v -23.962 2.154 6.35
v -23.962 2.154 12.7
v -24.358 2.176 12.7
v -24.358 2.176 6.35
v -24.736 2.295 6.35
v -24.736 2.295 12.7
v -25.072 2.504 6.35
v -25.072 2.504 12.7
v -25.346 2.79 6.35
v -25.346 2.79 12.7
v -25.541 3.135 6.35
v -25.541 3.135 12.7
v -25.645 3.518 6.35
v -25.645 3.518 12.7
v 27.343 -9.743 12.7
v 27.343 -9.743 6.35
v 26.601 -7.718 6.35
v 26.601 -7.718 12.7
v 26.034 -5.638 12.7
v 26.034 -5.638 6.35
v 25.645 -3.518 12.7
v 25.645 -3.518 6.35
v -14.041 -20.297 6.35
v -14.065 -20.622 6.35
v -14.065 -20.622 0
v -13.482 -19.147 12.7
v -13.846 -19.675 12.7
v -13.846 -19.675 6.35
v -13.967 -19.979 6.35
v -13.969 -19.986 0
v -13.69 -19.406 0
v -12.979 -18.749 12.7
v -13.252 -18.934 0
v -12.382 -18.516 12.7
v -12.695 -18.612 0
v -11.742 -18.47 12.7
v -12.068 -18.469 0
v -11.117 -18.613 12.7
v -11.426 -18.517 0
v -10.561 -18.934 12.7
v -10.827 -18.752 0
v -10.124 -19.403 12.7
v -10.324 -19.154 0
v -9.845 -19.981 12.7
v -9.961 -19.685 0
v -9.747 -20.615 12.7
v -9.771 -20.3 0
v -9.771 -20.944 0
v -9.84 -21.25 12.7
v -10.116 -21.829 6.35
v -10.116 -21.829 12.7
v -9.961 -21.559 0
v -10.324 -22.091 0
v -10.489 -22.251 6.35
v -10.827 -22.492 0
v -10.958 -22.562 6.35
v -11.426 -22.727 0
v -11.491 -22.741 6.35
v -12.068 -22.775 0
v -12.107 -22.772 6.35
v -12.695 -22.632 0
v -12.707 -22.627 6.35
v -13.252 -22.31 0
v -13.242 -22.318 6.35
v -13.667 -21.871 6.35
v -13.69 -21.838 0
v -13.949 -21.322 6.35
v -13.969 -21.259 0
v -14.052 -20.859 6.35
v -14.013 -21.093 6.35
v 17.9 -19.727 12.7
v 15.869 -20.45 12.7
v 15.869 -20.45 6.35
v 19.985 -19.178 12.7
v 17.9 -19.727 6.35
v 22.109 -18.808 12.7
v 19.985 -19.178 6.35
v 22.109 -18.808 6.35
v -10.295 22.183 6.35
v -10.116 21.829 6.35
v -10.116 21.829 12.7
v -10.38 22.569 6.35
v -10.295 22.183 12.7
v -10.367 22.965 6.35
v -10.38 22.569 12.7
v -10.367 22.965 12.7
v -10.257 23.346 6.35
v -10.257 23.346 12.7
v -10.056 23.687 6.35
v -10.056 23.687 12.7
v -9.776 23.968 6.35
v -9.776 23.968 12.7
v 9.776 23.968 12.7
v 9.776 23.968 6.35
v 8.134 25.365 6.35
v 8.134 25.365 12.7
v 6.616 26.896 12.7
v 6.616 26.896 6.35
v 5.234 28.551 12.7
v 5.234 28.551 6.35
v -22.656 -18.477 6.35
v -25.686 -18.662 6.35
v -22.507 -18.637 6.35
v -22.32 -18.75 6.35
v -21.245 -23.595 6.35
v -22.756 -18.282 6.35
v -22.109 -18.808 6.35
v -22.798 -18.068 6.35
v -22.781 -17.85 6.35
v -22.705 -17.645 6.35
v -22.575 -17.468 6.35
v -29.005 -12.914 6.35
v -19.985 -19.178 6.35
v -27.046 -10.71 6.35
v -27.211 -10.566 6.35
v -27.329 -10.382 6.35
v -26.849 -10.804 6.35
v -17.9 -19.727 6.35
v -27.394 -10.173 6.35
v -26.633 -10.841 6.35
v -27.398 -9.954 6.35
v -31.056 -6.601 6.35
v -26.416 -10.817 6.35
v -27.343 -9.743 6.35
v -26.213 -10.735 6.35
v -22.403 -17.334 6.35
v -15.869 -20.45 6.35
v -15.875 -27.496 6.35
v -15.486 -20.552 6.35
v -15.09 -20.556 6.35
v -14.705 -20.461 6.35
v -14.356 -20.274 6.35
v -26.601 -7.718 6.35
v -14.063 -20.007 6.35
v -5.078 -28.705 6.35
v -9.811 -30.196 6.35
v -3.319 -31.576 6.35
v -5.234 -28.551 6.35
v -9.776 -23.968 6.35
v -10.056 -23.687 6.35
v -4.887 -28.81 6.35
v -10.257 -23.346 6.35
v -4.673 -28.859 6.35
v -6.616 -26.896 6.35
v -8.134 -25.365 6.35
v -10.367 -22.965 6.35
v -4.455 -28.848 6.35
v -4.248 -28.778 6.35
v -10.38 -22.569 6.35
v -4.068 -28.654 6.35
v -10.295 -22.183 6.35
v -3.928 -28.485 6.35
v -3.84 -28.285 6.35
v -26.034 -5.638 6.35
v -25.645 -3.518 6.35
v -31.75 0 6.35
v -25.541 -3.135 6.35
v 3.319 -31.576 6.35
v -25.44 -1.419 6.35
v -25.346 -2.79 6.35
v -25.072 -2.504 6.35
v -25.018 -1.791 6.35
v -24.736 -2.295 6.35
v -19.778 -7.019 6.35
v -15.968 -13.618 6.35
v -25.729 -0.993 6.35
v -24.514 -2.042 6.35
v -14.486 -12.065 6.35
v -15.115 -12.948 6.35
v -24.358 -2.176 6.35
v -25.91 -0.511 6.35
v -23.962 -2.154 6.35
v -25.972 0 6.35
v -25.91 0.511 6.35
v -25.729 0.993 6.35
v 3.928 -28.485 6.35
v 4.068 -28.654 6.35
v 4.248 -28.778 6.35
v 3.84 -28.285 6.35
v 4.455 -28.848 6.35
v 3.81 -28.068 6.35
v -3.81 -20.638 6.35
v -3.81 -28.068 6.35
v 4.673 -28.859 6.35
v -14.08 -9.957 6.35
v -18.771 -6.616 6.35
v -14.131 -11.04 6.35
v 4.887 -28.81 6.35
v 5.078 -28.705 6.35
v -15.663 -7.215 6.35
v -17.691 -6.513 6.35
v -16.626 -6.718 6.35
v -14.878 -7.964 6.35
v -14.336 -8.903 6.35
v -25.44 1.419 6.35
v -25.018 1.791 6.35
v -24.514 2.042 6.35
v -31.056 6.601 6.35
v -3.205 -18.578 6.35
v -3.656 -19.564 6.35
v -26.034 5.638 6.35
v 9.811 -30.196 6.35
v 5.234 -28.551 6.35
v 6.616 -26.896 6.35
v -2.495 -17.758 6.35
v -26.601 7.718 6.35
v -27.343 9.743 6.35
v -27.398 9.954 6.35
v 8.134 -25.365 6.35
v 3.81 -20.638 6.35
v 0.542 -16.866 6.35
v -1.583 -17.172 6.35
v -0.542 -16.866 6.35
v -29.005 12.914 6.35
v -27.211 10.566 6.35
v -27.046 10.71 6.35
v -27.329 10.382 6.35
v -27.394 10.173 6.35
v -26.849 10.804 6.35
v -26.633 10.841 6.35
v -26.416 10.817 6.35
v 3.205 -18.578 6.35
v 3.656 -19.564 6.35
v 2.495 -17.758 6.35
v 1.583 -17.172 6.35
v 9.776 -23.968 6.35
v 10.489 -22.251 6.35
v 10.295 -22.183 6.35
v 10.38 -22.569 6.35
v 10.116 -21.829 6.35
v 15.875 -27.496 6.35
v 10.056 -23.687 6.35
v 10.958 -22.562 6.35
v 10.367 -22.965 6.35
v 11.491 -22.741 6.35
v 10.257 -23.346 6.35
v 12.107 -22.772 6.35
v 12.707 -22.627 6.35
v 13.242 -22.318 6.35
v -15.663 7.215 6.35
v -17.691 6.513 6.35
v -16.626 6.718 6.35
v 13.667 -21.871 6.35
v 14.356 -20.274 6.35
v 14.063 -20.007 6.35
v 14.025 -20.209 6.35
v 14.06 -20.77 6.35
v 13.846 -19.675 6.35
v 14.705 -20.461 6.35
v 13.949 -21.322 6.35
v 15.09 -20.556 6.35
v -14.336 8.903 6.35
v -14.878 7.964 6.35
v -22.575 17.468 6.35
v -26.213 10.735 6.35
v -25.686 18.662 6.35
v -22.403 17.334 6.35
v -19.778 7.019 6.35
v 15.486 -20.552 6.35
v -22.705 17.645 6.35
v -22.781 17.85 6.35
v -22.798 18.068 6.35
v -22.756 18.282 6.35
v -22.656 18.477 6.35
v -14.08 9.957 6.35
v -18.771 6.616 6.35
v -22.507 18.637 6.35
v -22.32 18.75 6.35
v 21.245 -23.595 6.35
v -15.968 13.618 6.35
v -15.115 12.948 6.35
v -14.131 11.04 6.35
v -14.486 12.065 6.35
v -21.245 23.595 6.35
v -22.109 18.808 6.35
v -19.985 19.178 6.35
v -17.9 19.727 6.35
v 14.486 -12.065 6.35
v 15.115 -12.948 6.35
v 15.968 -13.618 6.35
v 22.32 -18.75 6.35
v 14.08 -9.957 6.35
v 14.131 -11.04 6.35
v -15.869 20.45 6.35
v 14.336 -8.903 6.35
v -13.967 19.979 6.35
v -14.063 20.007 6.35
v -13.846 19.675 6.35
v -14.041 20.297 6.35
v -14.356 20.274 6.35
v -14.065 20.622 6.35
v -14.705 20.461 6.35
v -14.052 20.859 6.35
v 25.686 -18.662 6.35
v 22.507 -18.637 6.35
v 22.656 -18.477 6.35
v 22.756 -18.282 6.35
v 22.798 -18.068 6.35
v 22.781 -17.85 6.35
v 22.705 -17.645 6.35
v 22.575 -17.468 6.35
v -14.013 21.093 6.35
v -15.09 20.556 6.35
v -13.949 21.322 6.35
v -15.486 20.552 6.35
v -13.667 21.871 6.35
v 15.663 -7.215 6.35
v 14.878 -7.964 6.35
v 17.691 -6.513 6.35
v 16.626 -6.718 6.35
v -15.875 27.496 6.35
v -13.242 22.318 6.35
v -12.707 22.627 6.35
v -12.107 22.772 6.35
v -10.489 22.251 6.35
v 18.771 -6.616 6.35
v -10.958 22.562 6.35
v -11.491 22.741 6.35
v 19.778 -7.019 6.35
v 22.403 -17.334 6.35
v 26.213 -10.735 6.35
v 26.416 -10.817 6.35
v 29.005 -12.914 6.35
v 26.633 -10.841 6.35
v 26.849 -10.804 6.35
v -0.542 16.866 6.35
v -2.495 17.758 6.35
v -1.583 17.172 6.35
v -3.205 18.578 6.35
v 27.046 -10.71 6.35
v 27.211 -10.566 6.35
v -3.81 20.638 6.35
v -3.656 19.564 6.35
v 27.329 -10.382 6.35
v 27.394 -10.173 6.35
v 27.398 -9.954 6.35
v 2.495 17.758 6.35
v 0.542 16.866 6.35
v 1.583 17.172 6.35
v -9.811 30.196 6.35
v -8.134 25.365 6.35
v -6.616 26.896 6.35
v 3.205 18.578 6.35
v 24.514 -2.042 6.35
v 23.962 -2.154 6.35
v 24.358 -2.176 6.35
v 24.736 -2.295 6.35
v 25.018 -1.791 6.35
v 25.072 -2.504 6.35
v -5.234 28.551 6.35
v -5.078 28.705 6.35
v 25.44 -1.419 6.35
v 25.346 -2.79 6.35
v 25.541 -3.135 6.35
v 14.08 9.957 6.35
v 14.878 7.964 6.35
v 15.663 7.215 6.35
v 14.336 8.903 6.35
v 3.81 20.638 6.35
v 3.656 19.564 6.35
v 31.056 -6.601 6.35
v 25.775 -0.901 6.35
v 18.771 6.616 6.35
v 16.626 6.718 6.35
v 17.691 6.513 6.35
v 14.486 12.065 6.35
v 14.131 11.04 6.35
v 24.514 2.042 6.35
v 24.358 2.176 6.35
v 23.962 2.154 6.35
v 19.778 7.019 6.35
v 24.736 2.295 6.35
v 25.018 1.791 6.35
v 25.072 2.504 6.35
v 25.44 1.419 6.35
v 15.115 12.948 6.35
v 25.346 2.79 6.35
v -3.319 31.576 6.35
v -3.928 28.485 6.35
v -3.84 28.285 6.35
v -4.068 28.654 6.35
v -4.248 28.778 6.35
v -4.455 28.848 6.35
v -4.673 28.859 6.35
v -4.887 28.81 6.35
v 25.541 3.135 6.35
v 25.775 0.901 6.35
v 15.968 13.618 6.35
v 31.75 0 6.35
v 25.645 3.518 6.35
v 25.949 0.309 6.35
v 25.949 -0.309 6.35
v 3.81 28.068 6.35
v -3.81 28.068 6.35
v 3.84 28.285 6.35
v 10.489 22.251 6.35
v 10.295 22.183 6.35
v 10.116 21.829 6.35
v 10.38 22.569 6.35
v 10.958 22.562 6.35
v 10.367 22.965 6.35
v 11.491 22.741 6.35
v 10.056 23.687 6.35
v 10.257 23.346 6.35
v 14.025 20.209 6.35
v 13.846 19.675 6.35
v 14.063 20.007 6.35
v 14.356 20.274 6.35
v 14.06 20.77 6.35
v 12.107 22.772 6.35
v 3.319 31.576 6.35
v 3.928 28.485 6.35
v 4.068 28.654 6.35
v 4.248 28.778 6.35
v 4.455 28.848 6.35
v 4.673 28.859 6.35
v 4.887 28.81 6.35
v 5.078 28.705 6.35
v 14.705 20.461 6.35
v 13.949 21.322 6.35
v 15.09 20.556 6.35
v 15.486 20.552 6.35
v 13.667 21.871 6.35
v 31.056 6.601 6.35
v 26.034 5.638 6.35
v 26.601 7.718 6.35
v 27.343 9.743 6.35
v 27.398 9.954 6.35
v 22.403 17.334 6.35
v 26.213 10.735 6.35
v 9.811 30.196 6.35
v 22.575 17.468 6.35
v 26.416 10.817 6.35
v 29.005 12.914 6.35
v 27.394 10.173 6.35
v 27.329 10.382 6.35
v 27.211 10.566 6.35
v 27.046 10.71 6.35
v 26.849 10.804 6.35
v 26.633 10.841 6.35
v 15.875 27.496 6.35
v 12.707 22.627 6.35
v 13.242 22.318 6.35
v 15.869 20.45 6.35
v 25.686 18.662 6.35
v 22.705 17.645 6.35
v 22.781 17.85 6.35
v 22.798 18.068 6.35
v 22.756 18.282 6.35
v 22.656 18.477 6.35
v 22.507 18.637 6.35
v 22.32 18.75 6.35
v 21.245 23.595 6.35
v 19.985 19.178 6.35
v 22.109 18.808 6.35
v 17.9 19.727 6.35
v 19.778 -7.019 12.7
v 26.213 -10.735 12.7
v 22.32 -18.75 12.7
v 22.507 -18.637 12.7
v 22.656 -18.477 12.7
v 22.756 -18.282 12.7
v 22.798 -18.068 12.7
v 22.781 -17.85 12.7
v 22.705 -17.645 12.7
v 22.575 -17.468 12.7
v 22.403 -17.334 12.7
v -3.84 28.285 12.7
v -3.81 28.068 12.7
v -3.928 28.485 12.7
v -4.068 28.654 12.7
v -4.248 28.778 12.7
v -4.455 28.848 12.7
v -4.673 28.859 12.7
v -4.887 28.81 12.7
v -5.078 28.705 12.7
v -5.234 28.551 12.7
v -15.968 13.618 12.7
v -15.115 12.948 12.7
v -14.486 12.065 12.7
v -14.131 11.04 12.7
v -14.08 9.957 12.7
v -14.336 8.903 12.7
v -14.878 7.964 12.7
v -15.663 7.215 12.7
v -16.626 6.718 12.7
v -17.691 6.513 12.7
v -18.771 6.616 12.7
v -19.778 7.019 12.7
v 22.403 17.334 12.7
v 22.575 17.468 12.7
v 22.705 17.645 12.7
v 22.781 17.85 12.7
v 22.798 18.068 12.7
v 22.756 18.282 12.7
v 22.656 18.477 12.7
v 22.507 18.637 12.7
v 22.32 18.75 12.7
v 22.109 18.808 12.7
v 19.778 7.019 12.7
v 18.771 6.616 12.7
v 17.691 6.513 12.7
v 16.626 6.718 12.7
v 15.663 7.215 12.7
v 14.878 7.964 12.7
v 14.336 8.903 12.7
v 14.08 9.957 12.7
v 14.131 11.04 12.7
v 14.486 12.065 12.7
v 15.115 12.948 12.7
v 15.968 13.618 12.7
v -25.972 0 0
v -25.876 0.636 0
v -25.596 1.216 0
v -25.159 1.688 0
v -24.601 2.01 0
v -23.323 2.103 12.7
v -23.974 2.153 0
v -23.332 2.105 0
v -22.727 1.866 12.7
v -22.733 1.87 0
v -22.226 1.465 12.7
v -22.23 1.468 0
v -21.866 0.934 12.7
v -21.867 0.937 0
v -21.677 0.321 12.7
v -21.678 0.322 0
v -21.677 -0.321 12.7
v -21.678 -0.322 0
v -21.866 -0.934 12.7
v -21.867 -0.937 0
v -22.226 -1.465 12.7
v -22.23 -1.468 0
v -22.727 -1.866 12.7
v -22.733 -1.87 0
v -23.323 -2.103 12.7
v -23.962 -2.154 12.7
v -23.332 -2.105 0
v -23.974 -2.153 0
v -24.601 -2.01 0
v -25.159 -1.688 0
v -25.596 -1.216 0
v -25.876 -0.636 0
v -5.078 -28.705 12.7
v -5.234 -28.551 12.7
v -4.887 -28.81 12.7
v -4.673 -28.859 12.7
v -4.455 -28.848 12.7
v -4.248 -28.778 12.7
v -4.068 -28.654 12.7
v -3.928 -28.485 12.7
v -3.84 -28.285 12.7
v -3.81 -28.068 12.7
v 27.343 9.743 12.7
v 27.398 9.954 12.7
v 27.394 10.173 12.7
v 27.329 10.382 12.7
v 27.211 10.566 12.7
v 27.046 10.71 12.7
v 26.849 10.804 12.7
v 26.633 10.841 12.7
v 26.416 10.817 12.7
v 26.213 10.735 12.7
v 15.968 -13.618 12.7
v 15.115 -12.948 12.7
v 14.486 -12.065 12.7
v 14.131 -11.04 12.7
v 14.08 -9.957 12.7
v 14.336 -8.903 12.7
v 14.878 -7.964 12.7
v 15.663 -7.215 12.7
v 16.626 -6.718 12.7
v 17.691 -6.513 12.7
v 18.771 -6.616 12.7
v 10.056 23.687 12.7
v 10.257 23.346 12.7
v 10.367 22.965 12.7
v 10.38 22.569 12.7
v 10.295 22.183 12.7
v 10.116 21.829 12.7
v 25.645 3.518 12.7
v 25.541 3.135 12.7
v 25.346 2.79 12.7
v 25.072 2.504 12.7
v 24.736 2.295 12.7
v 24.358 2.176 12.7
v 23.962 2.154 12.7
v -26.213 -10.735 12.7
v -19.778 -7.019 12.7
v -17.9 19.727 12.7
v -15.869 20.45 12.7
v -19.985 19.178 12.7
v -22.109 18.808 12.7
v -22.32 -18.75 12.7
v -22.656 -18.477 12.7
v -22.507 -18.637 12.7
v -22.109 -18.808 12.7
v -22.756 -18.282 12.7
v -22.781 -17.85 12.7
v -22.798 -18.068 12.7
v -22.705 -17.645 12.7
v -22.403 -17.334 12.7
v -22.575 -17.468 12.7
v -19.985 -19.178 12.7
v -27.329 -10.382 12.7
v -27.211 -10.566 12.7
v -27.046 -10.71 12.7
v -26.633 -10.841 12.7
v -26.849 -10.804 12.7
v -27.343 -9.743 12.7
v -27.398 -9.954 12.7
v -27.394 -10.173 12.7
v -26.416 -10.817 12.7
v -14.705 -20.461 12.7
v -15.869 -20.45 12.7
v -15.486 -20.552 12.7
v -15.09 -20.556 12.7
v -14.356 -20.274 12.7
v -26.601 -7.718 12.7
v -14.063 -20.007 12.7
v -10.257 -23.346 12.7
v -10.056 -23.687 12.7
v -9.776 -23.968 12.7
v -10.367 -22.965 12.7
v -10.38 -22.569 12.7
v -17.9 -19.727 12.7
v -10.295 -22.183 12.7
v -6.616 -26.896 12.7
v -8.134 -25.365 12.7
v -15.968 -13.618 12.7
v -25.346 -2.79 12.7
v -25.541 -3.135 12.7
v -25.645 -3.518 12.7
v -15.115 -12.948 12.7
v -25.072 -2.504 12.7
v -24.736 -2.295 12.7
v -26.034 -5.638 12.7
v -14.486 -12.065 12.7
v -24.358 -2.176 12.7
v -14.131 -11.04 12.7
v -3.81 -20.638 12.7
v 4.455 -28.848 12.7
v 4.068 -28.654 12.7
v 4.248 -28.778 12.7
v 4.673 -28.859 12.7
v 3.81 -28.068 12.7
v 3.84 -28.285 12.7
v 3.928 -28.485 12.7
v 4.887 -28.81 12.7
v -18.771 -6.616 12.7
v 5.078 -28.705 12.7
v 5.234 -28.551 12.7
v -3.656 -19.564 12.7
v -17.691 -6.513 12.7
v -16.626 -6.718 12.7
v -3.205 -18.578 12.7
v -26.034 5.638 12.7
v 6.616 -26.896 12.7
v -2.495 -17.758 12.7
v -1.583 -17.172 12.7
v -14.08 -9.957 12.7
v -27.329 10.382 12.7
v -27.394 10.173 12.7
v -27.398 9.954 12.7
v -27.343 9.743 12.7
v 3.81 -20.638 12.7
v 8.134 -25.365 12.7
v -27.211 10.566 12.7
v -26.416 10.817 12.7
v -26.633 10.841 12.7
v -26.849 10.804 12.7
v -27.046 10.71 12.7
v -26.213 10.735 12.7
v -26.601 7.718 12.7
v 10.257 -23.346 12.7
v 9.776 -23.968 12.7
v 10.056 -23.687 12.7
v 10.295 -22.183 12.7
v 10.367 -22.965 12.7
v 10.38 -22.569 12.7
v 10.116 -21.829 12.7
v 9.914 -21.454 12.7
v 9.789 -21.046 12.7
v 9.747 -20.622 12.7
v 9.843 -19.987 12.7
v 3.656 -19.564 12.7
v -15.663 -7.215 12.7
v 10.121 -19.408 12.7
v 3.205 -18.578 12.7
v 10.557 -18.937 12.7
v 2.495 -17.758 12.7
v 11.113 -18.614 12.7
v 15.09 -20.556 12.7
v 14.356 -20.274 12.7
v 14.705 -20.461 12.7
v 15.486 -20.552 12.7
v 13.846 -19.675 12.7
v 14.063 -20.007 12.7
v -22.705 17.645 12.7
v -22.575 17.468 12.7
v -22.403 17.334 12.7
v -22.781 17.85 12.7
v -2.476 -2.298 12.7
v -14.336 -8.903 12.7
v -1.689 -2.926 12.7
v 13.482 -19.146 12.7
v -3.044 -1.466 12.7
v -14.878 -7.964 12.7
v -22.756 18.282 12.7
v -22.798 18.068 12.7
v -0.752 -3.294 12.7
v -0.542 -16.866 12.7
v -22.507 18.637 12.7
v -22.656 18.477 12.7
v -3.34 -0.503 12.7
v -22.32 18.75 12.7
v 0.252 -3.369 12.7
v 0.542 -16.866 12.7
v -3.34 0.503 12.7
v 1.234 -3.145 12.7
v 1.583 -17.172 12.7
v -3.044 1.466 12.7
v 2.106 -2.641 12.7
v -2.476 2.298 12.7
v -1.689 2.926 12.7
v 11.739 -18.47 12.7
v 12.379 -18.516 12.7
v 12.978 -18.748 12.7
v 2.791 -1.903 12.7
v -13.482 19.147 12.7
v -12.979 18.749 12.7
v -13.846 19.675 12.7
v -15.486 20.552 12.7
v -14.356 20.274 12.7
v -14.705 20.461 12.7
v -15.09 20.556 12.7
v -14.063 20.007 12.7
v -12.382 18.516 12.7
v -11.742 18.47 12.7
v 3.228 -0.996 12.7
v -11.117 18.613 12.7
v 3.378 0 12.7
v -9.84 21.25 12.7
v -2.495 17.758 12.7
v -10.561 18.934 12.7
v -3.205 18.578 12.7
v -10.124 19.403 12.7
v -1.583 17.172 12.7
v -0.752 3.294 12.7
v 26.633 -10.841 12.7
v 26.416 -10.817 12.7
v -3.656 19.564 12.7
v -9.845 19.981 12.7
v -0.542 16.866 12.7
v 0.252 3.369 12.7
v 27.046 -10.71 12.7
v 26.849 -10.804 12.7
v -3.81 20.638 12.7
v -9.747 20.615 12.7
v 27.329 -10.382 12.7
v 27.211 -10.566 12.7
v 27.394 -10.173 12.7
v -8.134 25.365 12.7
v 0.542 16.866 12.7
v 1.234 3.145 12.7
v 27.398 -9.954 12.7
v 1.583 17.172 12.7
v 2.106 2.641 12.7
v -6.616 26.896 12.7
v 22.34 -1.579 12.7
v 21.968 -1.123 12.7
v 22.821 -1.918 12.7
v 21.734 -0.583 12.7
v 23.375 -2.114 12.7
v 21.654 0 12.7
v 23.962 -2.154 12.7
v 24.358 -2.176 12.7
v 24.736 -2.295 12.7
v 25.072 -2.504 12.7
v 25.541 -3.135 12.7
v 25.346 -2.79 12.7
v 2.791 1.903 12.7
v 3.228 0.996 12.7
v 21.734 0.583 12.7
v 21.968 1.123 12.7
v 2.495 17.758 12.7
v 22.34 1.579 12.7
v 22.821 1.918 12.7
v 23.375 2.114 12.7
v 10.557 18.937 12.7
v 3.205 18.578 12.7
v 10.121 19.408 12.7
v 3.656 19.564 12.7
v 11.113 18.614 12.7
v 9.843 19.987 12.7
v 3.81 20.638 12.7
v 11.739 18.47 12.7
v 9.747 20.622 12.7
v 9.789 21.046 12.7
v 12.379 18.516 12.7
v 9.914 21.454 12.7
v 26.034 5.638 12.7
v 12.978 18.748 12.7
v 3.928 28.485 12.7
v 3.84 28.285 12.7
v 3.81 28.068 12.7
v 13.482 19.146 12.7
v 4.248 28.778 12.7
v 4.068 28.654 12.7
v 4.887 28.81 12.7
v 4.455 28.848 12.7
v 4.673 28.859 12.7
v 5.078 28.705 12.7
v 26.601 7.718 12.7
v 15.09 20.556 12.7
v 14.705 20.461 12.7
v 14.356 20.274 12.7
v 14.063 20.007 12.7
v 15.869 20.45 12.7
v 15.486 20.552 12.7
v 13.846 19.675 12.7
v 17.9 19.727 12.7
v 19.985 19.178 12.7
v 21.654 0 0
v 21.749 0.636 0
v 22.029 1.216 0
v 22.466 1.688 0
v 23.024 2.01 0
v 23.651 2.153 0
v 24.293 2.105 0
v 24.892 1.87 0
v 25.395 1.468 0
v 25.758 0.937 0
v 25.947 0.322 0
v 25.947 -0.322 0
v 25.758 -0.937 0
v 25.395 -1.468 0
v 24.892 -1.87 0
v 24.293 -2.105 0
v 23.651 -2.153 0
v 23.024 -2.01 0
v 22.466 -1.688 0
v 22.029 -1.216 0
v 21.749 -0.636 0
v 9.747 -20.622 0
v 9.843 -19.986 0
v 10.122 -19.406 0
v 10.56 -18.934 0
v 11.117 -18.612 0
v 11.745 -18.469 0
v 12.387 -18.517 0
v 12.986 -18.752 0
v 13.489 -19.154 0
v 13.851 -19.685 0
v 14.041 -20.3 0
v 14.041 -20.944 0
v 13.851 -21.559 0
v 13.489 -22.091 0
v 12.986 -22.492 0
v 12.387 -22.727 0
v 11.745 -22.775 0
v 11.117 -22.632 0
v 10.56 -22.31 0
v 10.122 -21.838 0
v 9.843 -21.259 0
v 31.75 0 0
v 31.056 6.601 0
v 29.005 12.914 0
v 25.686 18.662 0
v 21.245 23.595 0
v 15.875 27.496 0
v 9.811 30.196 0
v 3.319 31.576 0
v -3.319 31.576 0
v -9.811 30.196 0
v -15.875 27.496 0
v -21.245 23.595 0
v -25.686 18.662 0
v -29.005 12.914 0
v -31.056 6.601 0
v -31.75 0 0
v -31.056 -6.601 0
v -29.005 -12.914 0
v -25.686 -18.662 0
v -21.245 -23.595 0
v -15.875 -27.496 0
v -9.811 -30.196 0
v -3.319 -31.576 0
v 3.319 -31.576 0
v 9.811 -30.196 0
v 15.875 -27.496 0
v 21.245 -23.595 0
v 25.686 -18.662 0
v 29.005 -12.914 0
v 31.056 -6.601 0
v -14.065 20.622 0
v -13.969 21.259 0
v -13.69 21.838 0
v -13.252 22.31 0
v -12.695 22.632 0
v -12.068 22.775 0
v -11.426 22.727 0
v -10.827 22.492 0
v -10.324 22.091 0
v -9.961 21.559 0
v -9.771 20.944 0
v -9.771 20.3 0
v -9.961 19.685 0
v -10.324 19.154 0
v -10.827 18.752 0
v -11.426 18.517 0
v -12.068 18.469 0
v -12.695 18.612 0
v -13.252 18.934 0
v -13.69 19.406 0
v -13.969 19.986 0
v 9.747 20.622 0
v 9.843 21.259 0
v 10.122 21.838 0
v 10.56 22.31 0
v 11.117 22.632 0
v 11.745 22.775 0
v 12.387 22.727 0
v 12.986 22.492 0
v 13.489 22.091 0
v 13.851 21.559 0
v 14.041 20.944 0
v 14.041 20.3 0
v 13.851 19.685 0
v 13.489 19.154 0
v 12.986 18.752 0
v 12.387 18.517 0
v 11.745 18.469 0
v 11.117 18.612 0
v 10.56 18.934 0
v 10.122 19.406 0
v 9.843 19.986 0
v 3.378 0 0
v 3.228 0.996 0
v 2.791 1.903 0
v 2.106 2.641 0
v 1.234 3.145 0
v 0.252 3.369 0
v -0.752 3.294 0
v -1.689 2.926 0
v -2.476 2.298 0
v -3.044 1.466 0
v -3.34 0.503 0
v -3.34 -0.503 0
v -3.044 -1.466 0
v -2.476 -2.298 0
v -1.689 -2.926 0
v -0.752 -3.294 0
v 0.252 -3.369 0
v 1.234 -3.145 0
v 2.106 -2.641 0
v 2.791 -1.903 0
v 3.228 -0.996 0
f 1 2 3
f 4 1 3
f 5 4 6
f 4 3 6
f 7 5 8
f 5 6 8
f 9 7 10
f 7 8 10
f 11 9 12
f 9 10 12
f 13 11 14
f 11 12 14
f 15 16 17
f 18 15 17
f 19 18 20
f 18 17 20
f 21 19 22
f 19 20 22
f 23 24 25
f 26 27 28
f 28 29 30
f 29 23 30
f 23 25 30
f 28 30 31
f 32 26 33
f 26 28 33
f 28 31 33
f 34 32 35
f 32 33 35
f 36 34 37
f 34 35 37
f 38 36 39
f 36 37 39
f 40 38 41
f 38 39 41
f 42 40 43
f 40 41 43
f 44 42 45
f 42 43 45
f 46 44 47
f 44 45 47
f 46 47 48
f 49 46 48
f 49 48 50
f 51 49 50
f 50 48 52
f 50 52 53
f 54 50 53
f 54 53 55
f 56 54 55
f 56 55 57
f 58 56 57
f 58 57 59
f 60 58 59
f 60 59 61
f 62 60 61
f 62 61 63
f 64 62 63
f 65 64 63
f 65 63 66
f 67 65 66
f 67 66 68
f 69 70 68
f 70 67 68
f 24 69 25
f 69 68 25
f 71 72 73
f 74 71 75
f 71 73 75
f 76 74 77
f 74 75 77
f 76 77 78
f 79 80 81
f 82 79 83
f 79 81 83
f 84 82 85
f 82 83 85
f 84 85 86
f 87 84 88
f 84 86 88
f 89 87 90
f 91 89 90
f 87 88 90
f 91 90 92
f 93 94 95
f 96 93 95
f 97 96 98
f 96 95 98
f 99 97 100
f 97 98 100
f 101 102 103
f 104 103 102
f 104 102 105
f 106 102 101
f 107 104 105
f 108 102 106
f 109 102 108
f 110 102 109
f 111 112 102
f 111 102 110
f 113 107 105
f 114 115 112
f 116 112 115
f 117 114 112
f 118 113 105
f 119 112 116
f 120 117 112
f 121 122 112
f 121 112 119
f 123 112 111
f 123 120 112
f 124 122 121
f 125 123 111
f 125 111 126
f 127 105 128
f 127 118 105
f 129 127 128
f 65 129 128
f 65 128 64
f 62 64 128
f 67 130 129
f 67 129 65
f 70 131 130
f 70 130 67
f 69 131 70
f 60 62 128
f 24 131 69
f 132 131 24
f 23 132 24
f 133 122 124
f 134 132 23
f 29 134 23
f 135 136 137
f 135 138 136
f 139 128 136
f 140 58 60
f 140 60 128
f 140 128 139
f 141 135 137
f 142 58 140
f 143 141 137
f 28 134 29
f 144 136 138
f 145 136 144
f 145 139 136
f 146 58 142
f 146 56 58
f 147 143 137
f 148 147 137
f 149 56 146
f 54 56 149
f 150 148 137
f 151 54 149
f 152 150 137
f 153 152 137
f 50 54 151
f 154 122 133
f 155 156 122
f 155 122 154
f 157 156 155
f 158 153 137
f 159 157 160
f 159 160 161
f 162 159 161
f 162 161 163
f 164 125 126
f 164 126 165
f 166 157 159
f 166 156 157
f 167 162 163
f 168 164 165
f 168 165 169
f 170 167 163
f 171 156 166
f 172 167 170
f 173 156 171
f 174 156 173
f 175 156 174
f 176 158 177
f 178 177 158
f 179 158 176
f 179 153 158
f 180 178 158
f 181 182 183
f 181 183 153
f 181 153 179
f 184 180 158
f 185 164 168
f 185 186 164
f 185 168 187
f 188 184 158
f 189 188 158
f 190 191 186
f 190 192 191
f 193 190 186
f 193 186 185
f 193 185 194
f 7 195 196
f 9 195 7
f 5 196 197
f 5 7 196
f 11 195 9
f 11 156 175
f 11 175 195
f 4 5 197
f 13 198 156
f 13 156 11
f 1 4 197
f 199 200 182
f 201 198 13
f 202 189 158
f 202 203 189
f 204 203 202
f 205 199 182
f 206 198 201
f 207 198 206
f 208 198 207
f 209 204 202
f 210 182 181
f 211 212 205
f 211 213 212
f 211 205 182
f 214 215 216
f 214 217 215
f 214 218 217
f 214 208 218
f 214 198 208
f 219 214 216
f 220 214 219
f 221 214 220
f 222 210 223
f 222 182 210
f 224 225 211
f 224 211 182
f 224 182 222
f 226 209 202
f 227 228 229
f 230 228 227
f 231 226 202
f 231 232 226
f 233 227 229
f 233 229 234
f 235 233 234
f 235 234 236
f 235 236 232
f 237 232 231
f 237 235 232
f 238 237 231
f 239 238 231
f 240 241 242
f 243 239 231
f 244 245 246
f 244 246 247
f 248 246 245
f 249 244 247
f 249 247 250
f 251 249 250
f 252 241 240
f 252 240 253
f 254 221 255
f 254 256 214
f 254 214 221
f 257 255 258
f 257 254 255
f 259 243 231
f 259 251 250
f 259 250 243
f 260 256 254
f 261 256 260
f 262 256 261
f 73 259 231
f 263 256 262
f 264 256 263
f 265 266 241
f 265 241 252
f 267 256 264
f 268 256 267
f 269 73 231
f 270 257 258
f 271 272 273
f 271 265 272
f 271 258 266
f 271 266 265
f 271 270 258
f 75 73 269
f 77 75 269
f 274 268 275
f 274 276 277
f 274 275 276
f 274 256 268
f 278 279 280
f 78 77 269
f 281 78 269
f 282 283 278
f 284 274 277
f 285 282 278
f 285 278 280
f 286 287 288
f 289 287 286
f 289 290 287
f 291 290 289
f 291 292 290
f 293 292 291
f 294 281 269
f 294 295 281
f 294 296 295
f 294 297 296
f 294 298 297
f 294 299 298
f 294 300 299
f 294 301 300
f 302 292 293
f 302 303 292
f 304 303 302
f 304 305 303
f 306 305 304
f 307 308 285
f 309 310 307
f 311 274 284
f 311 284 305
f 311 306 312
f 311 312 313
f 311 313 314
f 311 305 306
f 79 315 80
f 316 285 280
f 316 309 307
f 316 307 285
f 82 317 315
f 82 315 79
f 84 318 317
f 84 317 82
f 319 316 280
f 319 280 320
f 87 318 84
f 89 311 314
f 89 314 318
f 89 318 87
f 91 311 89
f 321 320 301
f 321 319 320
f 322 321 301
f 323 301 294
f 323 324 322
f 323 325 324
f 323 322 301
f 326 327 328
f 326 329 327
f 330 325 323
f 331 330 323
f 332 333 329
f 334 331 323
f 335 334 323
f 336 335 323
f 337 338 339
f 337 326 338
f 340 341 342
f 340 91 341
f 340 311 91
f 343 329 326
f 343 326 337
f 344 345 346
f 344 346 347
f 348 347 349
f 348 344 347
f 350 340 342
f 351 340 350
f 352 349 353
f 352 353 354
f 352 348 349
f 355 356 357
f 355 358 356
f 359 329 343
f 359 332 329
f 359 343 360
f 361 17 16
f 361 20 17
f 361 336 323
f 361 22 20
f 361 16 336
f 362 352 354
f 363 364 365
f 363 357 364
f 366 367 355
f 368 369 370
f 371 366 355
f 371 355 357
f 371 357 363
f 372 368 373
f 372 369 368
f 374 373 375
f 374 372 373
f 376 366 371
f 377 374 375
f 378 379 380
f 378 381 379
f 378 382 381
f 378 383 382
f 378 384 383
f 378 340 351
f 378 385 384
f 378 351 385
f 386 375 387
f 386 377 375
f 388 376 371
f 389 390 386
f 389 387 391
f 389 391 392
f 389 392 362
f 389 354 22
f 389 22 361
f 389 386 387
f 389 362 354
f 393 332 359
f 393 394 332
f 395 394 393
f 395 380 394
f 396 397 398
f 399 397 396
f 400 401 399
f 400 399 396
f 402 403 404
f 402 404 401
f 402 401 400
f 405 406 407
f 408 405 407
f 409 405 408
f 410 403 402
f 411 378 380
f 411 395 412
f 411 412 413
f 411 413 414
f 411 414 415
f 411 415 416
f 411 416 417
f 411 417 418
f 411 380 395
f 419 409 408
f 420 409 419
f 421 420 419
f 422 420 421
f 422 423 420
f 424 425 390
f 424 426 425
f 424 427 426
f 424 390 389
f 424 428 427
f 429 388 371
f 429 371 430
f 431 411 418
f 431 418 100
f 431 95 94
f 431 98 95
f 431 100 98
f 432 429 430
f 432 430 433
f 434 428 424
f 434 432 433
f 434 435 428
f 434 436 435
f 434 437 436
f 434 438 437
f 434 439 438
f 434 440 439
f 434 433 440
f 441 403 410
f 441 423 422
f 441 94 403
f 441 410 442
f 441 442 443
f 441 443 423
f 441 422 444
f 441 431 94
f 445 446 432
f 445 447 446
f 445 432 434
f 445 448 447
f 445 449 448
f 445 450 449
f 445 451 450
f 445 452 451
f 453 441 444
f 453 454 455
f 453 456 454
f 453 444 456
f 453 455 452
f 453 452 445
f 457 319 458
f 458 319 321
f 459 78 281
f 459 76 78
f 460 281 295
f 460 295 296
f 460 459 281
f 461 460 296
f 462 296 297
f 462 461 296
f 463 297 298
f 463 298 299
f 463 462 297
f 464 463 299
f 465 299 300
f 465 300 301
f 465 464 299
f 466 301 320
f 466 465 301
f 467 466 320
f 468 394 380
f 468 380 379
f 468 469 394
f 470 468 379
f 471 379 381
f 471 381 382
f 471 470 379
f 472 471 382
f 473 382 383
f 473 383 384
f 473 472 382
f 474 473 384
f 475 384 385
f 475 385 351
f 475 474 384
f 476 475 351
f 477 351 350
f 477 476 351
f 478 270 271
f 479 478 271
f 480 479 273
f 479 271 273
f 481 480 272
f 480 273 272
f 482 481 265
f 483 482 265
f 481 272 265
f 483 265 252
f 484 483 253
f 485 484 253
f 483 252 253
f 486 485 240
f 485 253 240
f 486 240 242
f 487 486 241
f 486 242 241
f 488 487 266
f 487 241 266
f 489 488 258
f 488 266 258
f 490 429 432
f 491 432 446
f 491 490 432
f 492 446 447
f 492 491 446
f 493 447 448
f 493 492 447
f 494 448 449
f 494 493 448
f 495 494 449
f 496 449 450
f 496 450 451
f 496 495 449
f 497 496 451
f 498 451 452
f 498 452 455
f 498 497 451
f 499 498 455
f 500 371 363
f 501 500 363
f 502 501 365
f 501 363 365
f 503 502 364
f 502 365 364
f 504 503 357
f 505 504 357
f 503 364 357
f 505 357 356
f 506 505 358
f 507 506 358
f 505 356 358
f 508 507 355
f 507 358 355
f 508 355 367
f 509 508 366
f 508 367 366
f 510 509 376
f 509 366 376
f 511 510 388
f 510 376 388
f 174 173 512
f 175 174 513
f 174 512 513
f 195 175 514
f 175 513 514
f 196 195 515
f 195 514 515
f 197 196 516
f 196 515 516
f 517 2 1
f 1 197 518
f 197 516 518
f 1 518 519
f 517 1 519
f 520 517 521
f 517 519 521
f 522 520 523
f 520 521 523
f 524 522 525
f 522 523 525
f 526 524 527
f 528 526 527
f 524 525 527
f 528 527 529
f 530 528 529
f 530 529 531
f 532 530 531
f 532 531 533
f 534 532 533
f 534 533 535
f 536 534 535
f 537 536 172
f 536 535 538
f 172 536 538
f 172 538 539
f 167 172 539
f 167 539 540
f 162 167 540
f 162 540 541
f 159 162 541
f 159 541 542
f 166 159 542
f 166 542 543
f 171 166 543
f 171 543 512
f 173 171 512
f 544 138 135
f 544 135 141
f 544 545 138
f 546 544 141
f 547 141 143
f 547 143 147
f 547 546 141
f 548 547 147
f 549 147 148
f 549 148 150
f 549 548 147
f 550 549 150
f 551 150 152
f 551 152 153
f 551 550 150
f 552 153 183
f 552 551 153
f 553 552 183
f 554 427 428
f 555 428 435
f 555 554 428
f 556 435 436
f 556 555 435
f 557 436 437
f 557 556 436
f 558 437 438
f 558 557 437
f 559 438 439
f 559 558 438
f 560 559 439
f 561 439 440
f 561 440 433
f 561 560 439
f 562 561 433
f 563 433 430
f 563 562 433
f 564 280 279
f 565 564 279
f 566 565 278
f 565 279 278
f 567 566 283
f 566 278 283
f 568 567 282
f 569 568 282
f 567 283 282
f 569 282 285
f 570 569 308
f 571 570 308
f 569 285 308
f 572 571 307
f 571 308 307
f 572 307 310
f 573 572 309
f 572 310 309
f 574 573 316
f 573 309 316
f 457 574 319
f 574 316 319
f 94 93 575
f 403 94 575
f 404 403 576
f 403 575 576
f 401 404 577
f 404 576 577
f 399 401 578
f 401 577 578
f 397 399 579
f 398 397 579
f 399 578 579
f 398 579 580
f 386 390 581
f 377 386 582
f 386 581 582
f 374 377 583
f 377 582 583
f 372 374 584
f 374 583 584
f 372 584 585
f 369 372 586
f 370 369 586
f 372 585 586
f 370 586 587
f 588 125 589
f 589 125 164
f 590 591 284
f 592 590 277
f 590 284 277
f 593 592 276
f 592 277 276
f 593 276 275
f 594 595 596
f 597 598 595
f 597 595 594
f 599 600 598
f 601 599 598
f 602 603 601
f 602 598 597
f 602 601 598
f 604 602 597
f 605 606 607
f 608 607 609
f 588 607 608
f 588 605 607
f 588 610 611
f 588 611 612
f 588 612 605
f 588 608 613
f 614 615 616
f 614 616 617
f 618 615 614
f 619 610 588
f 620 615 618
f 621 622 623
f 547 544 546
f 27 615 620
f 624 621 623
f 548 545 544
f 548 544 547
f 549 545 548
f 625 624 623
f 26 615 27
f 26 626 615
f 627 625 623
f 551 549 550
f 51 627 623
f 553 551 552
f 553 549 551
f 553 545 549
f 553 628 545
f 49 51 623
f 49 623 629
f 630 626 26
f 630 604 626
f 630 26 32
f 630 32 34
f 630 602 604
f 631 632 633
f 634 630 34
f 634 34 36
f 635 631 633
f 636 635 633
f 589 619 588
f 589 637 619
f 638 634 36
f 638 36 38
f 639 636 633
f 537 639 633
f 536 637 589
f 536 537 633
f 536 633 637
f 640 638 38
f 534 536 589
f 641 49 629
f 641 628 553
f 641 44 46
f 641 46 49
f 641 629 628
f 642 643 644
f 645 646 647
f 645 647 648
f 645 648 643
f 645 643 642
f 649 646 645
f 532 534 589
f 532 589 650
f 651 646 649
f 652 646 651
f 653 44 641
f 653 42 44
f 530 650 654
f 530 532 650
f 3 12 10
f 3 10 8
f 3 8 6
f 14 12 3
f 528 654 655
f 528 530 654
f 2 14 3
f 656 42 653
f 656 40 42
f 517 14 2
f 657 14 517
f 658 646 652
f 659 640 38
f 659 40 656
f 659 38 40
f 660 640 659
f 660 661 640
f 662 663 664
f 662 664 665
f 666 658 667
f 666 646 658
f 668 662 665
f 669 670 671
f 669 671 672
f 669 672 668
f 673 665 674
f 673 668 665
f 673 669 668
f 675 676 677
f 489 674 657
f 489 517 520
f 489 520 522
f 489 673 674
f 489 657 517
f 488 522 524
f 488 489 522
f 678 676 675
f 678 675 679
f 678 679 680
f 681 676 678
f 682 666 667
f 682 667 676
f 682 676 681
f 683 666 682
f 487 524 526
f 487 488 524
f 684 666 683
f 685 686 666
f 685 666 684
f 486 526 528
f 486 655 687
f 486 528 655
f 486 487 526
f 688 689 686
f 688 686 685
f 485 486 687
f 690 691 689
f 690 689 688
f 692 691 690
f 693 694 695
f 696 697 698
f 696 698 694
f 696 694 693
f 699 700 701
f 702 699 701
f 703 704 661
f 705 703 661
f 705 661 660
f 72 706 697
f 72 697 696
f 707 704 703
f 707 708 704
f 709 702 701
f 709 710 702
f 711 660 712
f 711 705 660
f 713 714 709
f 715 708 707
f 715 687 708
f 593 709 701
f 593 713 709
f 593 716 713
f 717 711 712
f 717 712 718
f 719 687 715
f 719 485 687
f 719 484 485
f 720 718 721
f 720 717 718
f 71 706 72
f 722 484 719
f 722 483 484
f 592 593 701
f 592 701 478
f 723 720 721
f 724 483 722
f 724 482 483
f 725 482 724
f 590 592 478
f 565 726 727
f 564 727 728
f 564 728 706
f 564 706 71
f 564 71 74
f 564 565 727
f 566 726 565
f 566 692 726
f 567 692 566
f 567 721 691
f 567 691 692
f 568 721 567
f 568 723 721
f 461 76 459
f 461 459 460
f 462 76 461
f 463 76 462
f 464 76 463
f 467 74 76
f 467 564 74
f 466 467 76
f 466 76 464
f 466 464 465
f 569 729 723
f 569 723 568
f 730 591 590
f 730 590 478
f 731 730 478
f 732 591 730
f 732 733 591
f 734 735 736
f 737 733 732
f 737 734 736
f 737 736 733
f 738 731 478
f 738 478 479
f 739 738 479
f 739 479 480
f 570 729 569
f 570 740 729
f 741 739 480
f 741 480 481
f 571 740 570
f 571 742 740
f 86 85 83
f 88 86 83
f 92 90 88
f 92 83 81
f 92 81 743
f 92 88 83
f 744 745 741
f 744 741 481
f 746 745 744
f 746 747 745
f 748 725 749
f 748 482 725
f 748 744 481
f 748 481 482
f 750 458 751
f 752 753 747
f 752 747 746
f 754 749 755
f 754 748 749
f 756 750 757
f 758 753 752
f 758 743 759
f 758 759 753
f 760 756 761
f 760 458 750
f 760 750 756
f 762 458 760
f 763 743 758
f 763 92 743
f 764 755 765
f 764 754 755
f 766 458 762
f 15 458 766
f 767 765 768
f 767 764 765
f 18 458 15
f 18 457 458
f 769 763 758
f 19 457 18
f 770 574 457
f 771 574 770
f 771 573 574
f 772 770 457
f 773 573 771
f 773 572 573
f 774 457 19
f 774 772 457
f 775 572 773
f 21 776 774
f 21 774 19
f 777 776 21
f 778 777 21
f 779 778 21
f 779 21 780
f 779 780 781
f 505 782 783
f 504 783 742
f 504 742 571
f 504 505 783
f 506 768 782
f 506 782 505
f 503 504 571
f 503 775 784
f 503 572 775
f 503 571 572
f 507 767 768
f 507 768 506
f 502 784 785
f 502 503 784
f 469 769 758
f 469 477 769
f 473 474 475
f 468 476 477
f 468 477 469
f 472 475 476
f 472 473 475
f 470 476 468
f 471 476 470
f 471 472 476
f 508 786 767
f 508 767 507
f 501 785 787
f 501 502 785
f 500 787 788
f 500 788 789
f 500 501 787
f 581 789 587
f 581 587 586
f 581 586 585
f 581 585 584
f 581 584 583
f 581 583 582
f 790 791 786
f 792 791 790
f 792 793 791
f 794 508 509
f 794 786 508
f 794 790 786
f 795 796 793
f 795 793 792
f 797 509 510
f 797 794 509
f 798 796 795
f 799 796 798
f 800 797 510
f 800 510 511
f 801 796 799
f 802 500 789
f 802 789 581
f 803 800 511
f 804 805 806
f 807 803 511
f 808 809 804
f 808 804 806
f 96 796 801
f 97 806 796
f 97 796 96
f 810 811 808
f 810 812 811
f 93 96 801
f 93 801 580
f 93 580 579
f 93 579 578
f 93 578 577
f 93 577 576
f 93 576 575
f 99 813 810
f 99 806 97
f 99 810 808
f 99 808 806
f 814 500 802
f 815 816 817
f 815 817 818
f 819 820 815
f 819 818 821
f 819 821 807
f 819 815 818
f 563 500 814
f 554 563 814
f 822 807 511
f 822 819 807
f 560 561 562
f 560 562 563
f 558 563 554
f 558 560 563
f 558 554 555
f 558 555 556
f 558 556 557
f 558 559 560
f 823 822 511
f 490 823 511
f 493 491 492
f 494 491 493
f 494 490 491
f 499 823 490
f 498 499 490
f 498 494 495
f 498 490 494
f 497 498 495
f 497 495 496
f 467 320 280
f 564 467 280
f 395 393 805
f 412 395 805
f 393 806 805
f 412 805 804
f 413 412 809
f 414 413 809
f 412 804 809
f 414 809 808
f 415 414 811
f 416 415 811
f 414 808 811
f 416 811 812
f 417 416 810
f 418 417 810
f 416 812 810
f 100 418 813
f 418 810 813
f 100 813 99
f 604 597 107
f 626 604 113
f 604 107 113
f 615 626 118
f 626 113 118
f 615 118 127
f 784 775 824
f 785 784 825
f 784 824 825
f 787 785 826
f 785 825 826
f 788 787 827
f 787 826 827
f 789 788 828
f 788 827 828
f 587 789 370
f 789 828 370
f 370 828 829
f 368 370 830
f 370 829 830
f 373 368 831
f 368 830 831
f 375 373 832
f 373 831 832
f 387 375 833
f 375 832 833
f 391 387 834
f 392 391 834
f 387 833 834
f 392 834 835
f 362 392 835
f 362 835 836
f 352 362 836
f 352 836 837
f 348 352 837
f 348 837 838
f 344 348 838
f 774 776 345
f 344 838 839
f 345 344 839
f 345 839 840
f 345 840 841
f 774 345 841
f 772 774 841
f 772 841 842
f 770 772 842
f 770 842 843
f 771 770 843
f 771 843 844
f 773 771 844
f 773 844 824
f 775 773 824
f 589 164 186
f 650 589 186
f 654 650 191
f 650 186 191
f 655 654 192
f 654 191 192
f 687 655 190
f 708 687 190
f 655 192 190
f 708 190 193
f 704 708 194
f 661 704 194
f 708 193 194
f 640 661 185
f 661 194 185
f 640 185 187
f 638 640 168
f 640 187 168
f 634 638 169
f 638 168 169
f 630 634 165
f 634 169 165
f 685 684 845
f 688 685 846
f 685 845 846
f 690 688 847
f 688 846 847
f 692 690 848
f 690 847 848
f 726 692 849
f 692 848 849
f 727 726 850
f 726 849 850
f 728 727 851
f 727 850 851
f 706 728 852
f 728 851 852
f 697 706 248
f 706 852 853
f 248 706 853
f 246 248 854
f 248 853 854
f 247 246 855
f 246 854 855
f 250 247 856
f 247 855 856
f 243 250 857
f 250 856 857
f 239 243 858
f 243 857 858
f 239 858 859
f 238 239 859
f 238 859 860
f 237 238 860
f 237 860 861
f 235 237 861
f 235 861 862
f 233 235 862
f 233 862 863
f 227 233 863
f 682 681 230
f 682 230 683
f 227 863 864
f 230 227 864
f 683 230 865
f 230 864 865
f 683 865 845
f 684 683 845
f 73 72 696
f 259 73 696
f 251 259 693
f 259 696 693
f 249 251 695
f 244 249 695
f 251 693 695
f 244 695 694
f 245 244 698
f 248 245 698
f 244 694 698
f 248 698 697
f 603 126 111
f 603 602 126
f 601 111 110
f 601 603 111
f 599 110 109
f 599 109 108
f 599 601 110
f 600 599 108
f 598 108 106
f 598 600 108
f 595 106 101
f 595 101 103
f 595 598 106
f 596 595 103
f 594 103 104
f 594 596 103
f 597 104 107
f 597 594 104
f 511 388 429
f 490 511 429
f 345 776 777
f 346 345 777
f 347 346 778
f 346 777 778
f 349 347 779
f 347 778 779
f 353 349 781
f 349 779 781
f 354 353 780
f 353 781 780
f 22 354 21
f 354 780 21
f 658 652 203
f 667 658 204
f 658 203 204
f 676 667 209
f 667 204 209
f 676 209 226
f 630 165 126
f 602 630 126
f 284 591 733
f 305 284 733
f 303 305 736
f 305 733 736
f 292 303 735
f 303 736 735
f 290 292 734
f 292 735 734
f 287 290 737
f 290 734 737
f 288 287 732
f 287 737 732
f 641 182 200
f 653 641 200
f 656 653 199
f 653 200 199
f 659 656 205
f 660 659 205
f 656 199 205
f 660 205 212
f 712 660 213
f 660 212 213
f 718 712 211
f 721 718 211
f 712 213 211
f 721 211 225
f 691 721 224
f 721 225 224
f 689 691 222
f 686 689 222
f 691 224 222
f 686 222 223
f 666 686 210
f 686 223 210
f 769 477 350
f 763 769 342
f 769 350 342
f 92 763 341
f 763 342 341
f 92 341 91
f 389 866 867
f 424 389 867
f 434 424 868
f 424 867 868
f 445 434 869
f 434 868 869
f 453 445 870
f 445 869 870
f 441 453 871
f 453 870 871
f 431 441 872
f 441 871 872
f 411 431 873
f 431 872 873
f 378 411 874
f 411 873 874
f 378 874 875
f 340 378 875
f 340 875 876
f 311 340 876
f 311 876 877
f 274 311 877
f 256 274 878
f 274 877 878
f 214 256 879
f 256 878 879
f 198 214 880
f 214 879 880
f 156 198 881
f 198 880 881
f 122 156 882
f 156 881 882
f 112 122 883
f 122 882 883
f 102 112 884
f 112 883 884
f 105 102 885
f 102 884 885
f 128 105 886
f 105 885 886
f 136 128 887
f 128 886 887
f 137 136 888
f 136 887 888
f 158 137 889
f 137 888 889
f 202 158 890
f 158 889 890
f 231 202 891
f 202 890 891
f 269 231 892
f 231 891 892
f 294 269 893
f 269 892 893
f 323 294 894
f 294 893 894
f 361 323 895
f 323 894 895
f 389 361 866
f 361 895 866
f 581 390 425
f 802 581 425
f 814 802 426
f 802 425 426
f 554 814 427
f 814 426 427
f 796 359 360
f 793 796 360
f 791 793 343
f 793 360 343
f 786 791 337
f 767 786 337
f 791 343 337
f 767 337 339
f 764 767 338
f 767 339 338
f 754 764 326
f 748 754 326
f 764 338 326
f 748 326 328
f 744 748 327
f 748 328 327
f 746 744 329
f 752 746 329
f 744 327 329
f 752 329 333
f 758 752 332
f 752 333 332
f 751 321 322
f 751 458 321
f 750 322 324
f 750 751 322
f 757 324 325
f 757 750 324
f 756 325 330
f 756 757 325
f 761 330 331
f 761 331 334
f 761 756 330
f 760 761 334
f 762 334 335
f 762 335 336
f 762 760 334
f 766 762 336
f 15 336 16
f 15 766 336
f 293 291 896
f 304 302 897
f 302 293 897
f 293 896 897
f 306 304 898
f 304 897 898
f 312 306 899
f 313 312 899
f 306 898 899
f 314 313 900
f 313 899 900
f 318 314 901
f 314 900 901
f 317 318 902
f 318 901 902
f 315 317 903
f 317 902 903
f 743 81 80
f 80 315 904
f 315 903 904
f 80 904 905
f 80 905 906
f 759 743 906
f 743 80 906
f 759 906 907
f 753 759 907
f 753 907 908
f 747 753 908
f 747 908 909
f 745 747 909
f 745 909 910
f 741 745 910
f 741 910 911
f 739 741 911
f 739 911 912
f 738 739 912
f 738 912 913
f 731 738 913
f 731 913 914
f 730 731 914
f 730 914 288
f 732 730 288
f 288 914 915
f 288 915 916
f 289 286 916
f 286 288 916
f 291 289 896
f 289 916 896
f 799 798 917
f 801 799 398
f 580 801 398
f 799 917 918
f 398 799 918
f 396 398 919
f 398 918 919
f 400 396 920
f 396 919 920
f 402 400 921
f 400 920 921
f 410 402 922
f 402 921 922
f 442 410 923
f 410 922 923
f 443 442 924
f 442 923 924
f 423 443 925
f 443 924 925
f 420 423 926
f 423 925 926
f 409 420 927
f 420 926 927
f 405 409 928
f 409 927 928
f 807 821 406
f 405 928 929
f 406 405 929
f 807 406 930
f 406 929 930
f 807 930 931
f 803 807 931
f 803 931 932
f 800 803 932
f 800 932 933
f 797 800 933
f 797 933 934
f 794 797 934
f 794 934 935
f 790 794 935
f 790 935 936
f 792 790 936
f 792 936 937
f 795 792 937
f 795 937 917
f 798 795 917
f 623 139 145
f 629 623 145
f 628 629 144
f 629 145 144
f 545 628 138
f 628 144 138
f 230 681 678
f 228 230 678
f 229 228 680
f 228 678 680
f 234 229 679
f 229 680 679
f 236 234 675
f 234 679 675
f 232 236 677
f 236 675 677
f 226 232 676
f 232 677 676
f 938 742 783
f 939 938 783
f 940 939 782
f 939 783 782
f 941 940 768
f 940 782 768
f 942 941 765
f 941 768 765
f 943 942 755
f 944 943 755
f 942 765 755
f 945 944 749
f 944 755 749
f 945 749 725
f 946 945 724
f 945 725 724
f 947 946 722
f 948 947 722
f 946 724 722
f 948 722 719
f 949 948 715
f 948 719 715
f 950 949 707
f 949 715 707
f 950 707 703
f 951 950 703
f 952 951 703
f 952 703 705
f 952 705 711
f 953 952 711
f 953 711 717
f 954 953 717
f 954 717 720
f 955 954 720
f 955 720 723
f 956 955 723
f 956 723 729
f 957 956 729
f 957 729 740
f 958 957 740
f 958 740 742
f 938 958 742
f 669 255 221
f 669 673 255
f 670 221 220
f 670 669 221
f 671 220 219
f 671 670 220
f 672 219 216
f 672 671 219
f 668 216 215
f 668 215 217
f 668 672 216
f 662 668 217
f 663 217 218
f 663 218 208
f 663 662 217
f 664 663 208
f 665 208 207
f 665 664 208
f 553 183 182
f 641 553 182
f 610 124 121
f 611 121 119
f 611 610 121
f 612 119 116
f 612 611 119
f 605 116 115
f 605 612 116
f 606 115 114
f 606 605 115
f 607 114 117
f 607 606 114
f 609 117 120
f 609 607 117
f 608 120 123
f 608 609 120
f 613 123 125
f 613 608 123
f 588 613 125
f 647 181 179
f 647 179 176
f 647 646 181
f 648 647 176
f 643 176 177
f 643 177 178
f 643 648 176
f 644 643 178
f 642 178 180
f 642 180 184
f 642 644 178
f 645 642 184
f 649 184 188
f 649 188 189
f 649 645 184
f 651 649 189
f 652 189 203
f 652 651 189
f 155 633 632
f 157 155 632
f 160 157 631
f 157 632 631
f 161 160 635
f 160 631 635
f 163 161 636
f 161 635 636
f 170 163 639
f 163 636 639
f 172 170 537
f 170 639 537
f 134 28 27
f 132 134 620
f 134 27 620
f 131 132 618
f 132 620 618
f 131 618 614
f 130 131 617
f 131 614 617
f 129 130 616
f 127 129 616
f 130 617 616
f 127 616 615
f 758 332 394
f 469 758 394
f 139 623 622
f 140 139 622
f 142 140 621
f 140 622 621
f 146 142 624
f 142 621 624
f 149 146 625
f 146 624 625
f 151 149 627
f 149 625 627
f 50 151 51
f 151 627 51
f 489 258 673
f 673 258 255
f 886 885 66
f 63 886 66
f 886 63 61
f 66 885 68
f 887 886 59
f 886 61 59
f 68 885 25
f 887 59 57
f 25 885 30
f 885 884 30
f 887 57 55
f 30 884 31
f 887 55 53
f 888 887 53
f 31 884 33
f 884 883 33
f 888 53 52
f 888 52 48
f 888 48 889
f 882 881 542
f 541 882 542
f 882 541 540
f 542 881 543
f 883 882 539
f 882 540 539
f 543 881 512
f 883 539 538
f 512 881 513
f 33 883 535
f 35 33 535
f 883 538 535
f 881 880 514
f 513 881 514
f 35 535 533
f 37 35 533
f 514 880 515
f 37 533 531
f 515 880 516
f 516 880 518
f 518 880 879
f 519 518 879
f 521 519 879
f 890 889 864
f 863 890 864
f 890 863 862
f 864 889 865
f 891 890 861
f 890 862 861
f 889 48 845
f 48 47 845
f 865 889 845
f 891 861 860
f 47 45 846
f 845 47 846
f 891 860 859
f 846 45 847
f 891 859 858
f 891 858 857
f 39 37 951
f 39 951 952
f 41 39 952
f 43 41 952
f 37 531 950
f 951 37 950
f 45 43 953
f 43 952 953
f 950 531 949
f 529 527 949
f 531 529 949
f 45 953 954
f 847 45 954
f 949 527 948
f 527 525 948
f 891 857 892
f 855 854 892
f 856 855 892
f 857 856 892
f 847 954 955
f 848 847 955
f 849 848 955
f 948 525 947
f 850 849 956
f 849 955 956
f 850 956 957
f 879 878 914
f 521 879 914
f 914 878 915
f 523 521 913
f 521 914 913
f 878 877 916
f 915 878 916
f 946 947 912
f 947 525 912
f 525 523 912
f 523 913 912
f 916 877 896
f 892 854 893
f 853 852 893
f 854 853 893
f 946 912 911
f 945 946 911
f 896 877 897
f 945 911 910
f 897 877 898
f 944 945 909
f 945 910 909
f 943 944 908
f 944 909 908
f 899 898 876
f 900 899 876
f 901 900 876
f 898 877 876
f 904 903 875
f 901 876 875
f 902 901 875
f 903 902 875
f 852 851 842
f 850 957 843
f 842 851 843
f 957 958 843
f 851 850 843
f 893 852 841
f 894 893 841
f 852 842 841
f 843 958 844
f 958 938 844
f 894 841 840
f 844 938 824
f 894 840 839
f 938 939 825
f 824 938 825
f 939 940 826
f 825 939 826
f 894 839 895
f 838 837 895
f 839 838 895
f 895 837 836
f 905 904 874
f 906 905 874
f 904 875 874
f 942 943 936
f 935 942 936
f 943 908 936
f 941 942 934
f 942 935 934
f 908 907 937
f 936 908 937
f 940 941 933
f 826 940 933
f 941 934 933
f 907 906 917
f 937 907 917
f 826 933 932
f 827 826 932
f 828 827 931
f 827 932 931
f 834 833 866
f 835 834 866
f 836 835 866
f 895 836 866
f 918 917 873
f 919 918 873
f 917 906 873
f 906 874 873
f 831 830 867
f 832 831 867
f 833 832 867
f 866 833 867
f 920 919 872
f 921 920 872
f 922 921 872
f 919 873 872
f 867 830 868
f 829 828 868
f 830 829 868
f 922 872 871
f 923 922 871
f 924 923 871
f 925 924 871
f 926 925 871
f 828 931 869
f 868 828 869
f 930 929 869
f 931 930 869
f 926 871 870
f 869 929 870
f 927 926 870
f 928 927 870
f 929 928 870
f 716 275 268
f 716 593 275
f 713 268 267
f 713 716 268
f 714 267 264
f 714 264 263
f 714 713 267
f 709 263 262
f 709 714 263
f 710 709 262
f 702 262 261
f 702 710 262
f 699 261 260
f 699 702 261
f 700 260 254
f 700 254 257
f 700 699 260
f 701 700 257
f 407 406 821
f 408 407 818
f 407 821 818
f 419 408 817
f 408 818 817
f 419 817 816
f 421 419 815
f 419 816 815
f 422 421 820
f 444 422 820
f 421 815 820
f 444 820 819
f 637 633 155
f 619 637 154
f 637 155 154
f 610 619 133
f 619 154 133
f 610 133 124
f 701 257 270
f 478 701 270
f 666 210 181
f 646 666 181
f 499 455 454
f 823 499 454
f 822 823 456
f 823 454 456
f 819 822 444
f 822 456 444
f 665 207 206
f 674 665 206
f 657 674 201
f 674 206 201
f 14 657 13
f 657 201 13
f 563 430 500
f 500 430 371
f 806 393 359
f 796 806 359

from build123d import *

# Parameters (mm, degrees)
SKETCH2_R           = 31.75
BOSS_EXTRUDE1_DEPTH = 6.35
BOSS_EXTRUDE2_DEPTH = 6.35
SKETCH4_R           = 3.3782
CUT_EXTRUDE1_DEPTH  = 47.6627796
FILLET2_R           = 0.79375
SKETCH5_R           = 2.159
CUT_EXTRUDE2_DEPTH  = 47.6627796
FILLET3_R           = 1.5875


with BuildPart() as part:
    # Sketch2 → Boss-Extrude1 (new body)
    with BuildSketch(Plane.XY):
        Circle(SKETCH2_R)
    extrude(amount=BOSS_EXTRUDE1_DEPTH)

    # Sketch3 → Boss-Extrude2 (add)
    with BuildSketch(Plane.XY.offset(6.35)):
        with BuildLine():
            Line((3.81, 30.613810246), (3.81, 20.6375))
            ThreePointArc((3.81, 20.6375), (0, 16.8275), (-3.81, 20.6375))
            Line((-3.81, 20.6375), (-3.81, 30.613810246))
            ThreePointArc((-3.81, 30.613810246), (-12.7, 21.997045256), (-24.60733738, 18.606461911))
            Line((-24.60733738, 18.606461911), (-15.967599271, 13.618306788))
            ThreePointArc((-15.967599271, 13.618306788), (-14.573042482, 8.41375), (-19.777599271, 7.019193212))
            Line((-19.777599271, 7.019193212), (-28.41733738, 12.007348335))
            ThreePointArc((-28.41733738, 12.007348335), (-25.4, 0), (-28.41733738, -12.007348335))
            Line((-28.41733738, -12.007348335), (-19.777599271, -7.019193212))
            ThreePointArc((-19.777599271, -7.019193212), (-14.573042482, -8.41375), (-15.967599271, -13.618306788))
            Line((-15.967599271, -13.618306788), (-24.60733738, -18.606461911))
            ThreePointArc((-24.60733738, -18.606461911), (-12.7, -21.997045256), (-3.81, -30.613810246))
            Line((-3.81, -30.613810246), (-3.81, -20.6375))
            ThreePointArc((-3.81, -20.6375), (0, -16.8275), (3.81, -20.6375))
            Line((3.81, -20.6375), (3.81, -30.613810246))
            ThreePointArc((3.81, -30.613810246), (12.7, -21.997045256), (24.60733738, -18.606461911))
            Line((24.60733738, -18.606461911), (15.967599271, -13.618306788))
            ThreePointArc((15.967599271, -13.618306788), (14.573042482, -8.41375), (19.777599271, -7.019193212))
            Line((19.777599271, -7.019193212), (28.41733738, -12.007348335))
            ThreePointArc((28.41733738, -12.007348335), (25.4, 0), (28.41733738, 12.007348335))
            Line((28.41733738, 12.007348335), (19.777599271, 7.019193212))
            ThreePointArc((19.777599271, 7.019193212), (14.573042482, 8.41375), (15.967599271, 13.618306788))
            Line((15.967599271, 13.618306788), (24.60733738, 18.606461911))
            ThreePointArc((24.60733738, 18.606461911), (12.7, 21.997045256), (3.81, 30.613810246))
        make_face()
    extrude(amount=BOSS_EXTRUDE2_DEPTH)

    # Sketch4 → Cut-Extrude1 (cut, through all)
    with BuildSketch(Plane.XY.offset(12.7)):
        Circle(SKETCH4_R)
    extrude(amount=-CUT_EXTRUDE1_DEPTH, mode=Mode.SUBTRACT)

    # Fillet2
    fillet2_edges = [part.edges().sort_by_distance(p)[0] for p in [
        (-28.41733738, 12.007348335, 9.525),
        (-28.41733738, -12.007348335, 9.525),
        (-24.60733738, -18.606461911, 9.525),
        (-3.81, -30.613810246, 9.525),
        (3.81, -30.613810246, 9.525),
        (24.60733738, -18.606461911, 9.525),
        (28.41733738, -12.007348335, 9.525),
        (28.41733738, 12.007348335, 9.525),
        (24.60733738, 18.606461911, 9.525),
        (3.81, 30.613810246, 9.525),
        (-3.81, 30.613810246, 9.525),
        (-24.60733738, 18.606461911, 9.525),
    ]]
    fillet(fillet2_edges, radius=FILLET2_R)

    # Sketch5 → Cut-Extrude2 (cut, through all)
    with BuildSketch(Plane(origin=(0, 0, 0), x_dir=(-1, 0, 0), z_dir=(0, 0, -1))):
        with Locations((-11.90625, 20.622229928)):
            Circle(SKETCH5_R)
        with Locations((11.90625, 20.622229928)):
            Circle(SKETCH5_R)
        with Locations((23.8125, 0)):
            Circle(SKETCH5_R)
        with Locations((11.90625, -20.622229928)):
            Circle(SKETCH5_R)
        with Locations((-11.90625, -20.622229928)):
            Circle(SKETCH5_R)
        with Locations((-23.8125, 0)):
            Circle(SKETCH5_R)
    extrude(amount=-CUT_EXTRUDE2_DEPTH, mode=Mode.SUBTRACT)

    # Fillet3
    # the kernel refuses this fillet: 1.5875 mm, written as the material it takes off along each edge
    with BuildSketch(Plane(origin=(25.439668824, 1.419014665, 17.971488678), x_dir=(-0.8953649723474578, 0.44533309588805103, 0), z_dir=(0, 0, -1)), Plane(origin=(13.94873716, -21.321892132, 17.971488678), x_dir=(-0.06201271198897514, 0.9980753596556587, 0), z_dir=(0, 0, -1)), Plane(origin=(-11.490931663, -22.740906798, 17.971488678), x_dir=(0.8333522603583458, 0.5527422637682374, 0), z_dir=(0, 0, -1)), Plane(origin=(-25.439668824, -1.419014665, 17.971488678), x_dir=(0.8953649723478783, -0.4453330958872058, 0), z_dir=(0, 0, -1)), Plane(origin=(-13.94873716, 21.321892132, 17.971488678), x_dir=(0.062012711989375524, -0.9980753596556338, 0), z_dir=(0, 0, -1)), Plane(origin=(11.490931663, 22.740906798, 17.971488678), x_dir=(-0.833352260358639, -0.5527422637677954, 0), z_dir=(0, 0, -1))) as fillet3_piece_1:
        with BuildLine():
            CenterArc((2.256551384, 1.467035409), FILLET3_R, 161.515751163, 86.019798363)
            ThreePointArc((0.75094916, 1.970342665), (0.395929534, 0.977375414), (0, 0))
            ThreePointArc((0, 0), (0.824975775, 0.163831844), (1.64995155, 0))
        make_face()
    extrude(amount=11.621488678, mode=Mode.SUBTRACT)
    with BuildSketch(Plane(origin=(25.439668824, -1.419014665, 17.971488678), x_dir=(0.0972615315412338, -0.9952588580275252, 0), z_dir=(0, 0, -1)), Plane(origin=(11.490931663, -22.740906798, 17.971488678), x_dir=(-0.8132886886226869, -0.5818603861394845, 0), z_dir=(0, 0, -1)), Plane(origin=(-13.94873716, -21.321892132, 17.971488678), x_dir=(-0.9105502201639706, 0.4133984718880137, 0), z_dir=(0, 0, -1)), Plane(origin=(-25.439668824, 1.419014665, 17.971488678), x_dir=(-0.09726153154127824, 0.9952588580275209, 0), z_dir=(0, 0, -1)), Plane(origin=(-11.490931663, 22.740906798, 17.971488678), x_dir=(0.8132886886227111, 0.5818603861394509, 0), z_dir=(0, 0, -1)), Plane(origin=(13.94873716, 21.321892132, 17.971488678), x_dir=(0.9105502201639338, -0.41339847188809425, 0), z_dir=(0, 0, -1))) as fillet3_piece_2:
        with BuildLine():
            CenterArc((2.17448908, 1.586131862), FILLET3_R, 181.601297313, 86.019798363)
            ThreePointArc((0.587609026, 1.541770329), (0.446894509, 0.71253856), (0, 0))
            ThreePointArc((0, 0), (1.054297736, 0.021890215), (2.108595471, 0))
        make_face()
    extrude(amount=11.621488678, mode=Mode.SUBTRACT)


solid = part.part
